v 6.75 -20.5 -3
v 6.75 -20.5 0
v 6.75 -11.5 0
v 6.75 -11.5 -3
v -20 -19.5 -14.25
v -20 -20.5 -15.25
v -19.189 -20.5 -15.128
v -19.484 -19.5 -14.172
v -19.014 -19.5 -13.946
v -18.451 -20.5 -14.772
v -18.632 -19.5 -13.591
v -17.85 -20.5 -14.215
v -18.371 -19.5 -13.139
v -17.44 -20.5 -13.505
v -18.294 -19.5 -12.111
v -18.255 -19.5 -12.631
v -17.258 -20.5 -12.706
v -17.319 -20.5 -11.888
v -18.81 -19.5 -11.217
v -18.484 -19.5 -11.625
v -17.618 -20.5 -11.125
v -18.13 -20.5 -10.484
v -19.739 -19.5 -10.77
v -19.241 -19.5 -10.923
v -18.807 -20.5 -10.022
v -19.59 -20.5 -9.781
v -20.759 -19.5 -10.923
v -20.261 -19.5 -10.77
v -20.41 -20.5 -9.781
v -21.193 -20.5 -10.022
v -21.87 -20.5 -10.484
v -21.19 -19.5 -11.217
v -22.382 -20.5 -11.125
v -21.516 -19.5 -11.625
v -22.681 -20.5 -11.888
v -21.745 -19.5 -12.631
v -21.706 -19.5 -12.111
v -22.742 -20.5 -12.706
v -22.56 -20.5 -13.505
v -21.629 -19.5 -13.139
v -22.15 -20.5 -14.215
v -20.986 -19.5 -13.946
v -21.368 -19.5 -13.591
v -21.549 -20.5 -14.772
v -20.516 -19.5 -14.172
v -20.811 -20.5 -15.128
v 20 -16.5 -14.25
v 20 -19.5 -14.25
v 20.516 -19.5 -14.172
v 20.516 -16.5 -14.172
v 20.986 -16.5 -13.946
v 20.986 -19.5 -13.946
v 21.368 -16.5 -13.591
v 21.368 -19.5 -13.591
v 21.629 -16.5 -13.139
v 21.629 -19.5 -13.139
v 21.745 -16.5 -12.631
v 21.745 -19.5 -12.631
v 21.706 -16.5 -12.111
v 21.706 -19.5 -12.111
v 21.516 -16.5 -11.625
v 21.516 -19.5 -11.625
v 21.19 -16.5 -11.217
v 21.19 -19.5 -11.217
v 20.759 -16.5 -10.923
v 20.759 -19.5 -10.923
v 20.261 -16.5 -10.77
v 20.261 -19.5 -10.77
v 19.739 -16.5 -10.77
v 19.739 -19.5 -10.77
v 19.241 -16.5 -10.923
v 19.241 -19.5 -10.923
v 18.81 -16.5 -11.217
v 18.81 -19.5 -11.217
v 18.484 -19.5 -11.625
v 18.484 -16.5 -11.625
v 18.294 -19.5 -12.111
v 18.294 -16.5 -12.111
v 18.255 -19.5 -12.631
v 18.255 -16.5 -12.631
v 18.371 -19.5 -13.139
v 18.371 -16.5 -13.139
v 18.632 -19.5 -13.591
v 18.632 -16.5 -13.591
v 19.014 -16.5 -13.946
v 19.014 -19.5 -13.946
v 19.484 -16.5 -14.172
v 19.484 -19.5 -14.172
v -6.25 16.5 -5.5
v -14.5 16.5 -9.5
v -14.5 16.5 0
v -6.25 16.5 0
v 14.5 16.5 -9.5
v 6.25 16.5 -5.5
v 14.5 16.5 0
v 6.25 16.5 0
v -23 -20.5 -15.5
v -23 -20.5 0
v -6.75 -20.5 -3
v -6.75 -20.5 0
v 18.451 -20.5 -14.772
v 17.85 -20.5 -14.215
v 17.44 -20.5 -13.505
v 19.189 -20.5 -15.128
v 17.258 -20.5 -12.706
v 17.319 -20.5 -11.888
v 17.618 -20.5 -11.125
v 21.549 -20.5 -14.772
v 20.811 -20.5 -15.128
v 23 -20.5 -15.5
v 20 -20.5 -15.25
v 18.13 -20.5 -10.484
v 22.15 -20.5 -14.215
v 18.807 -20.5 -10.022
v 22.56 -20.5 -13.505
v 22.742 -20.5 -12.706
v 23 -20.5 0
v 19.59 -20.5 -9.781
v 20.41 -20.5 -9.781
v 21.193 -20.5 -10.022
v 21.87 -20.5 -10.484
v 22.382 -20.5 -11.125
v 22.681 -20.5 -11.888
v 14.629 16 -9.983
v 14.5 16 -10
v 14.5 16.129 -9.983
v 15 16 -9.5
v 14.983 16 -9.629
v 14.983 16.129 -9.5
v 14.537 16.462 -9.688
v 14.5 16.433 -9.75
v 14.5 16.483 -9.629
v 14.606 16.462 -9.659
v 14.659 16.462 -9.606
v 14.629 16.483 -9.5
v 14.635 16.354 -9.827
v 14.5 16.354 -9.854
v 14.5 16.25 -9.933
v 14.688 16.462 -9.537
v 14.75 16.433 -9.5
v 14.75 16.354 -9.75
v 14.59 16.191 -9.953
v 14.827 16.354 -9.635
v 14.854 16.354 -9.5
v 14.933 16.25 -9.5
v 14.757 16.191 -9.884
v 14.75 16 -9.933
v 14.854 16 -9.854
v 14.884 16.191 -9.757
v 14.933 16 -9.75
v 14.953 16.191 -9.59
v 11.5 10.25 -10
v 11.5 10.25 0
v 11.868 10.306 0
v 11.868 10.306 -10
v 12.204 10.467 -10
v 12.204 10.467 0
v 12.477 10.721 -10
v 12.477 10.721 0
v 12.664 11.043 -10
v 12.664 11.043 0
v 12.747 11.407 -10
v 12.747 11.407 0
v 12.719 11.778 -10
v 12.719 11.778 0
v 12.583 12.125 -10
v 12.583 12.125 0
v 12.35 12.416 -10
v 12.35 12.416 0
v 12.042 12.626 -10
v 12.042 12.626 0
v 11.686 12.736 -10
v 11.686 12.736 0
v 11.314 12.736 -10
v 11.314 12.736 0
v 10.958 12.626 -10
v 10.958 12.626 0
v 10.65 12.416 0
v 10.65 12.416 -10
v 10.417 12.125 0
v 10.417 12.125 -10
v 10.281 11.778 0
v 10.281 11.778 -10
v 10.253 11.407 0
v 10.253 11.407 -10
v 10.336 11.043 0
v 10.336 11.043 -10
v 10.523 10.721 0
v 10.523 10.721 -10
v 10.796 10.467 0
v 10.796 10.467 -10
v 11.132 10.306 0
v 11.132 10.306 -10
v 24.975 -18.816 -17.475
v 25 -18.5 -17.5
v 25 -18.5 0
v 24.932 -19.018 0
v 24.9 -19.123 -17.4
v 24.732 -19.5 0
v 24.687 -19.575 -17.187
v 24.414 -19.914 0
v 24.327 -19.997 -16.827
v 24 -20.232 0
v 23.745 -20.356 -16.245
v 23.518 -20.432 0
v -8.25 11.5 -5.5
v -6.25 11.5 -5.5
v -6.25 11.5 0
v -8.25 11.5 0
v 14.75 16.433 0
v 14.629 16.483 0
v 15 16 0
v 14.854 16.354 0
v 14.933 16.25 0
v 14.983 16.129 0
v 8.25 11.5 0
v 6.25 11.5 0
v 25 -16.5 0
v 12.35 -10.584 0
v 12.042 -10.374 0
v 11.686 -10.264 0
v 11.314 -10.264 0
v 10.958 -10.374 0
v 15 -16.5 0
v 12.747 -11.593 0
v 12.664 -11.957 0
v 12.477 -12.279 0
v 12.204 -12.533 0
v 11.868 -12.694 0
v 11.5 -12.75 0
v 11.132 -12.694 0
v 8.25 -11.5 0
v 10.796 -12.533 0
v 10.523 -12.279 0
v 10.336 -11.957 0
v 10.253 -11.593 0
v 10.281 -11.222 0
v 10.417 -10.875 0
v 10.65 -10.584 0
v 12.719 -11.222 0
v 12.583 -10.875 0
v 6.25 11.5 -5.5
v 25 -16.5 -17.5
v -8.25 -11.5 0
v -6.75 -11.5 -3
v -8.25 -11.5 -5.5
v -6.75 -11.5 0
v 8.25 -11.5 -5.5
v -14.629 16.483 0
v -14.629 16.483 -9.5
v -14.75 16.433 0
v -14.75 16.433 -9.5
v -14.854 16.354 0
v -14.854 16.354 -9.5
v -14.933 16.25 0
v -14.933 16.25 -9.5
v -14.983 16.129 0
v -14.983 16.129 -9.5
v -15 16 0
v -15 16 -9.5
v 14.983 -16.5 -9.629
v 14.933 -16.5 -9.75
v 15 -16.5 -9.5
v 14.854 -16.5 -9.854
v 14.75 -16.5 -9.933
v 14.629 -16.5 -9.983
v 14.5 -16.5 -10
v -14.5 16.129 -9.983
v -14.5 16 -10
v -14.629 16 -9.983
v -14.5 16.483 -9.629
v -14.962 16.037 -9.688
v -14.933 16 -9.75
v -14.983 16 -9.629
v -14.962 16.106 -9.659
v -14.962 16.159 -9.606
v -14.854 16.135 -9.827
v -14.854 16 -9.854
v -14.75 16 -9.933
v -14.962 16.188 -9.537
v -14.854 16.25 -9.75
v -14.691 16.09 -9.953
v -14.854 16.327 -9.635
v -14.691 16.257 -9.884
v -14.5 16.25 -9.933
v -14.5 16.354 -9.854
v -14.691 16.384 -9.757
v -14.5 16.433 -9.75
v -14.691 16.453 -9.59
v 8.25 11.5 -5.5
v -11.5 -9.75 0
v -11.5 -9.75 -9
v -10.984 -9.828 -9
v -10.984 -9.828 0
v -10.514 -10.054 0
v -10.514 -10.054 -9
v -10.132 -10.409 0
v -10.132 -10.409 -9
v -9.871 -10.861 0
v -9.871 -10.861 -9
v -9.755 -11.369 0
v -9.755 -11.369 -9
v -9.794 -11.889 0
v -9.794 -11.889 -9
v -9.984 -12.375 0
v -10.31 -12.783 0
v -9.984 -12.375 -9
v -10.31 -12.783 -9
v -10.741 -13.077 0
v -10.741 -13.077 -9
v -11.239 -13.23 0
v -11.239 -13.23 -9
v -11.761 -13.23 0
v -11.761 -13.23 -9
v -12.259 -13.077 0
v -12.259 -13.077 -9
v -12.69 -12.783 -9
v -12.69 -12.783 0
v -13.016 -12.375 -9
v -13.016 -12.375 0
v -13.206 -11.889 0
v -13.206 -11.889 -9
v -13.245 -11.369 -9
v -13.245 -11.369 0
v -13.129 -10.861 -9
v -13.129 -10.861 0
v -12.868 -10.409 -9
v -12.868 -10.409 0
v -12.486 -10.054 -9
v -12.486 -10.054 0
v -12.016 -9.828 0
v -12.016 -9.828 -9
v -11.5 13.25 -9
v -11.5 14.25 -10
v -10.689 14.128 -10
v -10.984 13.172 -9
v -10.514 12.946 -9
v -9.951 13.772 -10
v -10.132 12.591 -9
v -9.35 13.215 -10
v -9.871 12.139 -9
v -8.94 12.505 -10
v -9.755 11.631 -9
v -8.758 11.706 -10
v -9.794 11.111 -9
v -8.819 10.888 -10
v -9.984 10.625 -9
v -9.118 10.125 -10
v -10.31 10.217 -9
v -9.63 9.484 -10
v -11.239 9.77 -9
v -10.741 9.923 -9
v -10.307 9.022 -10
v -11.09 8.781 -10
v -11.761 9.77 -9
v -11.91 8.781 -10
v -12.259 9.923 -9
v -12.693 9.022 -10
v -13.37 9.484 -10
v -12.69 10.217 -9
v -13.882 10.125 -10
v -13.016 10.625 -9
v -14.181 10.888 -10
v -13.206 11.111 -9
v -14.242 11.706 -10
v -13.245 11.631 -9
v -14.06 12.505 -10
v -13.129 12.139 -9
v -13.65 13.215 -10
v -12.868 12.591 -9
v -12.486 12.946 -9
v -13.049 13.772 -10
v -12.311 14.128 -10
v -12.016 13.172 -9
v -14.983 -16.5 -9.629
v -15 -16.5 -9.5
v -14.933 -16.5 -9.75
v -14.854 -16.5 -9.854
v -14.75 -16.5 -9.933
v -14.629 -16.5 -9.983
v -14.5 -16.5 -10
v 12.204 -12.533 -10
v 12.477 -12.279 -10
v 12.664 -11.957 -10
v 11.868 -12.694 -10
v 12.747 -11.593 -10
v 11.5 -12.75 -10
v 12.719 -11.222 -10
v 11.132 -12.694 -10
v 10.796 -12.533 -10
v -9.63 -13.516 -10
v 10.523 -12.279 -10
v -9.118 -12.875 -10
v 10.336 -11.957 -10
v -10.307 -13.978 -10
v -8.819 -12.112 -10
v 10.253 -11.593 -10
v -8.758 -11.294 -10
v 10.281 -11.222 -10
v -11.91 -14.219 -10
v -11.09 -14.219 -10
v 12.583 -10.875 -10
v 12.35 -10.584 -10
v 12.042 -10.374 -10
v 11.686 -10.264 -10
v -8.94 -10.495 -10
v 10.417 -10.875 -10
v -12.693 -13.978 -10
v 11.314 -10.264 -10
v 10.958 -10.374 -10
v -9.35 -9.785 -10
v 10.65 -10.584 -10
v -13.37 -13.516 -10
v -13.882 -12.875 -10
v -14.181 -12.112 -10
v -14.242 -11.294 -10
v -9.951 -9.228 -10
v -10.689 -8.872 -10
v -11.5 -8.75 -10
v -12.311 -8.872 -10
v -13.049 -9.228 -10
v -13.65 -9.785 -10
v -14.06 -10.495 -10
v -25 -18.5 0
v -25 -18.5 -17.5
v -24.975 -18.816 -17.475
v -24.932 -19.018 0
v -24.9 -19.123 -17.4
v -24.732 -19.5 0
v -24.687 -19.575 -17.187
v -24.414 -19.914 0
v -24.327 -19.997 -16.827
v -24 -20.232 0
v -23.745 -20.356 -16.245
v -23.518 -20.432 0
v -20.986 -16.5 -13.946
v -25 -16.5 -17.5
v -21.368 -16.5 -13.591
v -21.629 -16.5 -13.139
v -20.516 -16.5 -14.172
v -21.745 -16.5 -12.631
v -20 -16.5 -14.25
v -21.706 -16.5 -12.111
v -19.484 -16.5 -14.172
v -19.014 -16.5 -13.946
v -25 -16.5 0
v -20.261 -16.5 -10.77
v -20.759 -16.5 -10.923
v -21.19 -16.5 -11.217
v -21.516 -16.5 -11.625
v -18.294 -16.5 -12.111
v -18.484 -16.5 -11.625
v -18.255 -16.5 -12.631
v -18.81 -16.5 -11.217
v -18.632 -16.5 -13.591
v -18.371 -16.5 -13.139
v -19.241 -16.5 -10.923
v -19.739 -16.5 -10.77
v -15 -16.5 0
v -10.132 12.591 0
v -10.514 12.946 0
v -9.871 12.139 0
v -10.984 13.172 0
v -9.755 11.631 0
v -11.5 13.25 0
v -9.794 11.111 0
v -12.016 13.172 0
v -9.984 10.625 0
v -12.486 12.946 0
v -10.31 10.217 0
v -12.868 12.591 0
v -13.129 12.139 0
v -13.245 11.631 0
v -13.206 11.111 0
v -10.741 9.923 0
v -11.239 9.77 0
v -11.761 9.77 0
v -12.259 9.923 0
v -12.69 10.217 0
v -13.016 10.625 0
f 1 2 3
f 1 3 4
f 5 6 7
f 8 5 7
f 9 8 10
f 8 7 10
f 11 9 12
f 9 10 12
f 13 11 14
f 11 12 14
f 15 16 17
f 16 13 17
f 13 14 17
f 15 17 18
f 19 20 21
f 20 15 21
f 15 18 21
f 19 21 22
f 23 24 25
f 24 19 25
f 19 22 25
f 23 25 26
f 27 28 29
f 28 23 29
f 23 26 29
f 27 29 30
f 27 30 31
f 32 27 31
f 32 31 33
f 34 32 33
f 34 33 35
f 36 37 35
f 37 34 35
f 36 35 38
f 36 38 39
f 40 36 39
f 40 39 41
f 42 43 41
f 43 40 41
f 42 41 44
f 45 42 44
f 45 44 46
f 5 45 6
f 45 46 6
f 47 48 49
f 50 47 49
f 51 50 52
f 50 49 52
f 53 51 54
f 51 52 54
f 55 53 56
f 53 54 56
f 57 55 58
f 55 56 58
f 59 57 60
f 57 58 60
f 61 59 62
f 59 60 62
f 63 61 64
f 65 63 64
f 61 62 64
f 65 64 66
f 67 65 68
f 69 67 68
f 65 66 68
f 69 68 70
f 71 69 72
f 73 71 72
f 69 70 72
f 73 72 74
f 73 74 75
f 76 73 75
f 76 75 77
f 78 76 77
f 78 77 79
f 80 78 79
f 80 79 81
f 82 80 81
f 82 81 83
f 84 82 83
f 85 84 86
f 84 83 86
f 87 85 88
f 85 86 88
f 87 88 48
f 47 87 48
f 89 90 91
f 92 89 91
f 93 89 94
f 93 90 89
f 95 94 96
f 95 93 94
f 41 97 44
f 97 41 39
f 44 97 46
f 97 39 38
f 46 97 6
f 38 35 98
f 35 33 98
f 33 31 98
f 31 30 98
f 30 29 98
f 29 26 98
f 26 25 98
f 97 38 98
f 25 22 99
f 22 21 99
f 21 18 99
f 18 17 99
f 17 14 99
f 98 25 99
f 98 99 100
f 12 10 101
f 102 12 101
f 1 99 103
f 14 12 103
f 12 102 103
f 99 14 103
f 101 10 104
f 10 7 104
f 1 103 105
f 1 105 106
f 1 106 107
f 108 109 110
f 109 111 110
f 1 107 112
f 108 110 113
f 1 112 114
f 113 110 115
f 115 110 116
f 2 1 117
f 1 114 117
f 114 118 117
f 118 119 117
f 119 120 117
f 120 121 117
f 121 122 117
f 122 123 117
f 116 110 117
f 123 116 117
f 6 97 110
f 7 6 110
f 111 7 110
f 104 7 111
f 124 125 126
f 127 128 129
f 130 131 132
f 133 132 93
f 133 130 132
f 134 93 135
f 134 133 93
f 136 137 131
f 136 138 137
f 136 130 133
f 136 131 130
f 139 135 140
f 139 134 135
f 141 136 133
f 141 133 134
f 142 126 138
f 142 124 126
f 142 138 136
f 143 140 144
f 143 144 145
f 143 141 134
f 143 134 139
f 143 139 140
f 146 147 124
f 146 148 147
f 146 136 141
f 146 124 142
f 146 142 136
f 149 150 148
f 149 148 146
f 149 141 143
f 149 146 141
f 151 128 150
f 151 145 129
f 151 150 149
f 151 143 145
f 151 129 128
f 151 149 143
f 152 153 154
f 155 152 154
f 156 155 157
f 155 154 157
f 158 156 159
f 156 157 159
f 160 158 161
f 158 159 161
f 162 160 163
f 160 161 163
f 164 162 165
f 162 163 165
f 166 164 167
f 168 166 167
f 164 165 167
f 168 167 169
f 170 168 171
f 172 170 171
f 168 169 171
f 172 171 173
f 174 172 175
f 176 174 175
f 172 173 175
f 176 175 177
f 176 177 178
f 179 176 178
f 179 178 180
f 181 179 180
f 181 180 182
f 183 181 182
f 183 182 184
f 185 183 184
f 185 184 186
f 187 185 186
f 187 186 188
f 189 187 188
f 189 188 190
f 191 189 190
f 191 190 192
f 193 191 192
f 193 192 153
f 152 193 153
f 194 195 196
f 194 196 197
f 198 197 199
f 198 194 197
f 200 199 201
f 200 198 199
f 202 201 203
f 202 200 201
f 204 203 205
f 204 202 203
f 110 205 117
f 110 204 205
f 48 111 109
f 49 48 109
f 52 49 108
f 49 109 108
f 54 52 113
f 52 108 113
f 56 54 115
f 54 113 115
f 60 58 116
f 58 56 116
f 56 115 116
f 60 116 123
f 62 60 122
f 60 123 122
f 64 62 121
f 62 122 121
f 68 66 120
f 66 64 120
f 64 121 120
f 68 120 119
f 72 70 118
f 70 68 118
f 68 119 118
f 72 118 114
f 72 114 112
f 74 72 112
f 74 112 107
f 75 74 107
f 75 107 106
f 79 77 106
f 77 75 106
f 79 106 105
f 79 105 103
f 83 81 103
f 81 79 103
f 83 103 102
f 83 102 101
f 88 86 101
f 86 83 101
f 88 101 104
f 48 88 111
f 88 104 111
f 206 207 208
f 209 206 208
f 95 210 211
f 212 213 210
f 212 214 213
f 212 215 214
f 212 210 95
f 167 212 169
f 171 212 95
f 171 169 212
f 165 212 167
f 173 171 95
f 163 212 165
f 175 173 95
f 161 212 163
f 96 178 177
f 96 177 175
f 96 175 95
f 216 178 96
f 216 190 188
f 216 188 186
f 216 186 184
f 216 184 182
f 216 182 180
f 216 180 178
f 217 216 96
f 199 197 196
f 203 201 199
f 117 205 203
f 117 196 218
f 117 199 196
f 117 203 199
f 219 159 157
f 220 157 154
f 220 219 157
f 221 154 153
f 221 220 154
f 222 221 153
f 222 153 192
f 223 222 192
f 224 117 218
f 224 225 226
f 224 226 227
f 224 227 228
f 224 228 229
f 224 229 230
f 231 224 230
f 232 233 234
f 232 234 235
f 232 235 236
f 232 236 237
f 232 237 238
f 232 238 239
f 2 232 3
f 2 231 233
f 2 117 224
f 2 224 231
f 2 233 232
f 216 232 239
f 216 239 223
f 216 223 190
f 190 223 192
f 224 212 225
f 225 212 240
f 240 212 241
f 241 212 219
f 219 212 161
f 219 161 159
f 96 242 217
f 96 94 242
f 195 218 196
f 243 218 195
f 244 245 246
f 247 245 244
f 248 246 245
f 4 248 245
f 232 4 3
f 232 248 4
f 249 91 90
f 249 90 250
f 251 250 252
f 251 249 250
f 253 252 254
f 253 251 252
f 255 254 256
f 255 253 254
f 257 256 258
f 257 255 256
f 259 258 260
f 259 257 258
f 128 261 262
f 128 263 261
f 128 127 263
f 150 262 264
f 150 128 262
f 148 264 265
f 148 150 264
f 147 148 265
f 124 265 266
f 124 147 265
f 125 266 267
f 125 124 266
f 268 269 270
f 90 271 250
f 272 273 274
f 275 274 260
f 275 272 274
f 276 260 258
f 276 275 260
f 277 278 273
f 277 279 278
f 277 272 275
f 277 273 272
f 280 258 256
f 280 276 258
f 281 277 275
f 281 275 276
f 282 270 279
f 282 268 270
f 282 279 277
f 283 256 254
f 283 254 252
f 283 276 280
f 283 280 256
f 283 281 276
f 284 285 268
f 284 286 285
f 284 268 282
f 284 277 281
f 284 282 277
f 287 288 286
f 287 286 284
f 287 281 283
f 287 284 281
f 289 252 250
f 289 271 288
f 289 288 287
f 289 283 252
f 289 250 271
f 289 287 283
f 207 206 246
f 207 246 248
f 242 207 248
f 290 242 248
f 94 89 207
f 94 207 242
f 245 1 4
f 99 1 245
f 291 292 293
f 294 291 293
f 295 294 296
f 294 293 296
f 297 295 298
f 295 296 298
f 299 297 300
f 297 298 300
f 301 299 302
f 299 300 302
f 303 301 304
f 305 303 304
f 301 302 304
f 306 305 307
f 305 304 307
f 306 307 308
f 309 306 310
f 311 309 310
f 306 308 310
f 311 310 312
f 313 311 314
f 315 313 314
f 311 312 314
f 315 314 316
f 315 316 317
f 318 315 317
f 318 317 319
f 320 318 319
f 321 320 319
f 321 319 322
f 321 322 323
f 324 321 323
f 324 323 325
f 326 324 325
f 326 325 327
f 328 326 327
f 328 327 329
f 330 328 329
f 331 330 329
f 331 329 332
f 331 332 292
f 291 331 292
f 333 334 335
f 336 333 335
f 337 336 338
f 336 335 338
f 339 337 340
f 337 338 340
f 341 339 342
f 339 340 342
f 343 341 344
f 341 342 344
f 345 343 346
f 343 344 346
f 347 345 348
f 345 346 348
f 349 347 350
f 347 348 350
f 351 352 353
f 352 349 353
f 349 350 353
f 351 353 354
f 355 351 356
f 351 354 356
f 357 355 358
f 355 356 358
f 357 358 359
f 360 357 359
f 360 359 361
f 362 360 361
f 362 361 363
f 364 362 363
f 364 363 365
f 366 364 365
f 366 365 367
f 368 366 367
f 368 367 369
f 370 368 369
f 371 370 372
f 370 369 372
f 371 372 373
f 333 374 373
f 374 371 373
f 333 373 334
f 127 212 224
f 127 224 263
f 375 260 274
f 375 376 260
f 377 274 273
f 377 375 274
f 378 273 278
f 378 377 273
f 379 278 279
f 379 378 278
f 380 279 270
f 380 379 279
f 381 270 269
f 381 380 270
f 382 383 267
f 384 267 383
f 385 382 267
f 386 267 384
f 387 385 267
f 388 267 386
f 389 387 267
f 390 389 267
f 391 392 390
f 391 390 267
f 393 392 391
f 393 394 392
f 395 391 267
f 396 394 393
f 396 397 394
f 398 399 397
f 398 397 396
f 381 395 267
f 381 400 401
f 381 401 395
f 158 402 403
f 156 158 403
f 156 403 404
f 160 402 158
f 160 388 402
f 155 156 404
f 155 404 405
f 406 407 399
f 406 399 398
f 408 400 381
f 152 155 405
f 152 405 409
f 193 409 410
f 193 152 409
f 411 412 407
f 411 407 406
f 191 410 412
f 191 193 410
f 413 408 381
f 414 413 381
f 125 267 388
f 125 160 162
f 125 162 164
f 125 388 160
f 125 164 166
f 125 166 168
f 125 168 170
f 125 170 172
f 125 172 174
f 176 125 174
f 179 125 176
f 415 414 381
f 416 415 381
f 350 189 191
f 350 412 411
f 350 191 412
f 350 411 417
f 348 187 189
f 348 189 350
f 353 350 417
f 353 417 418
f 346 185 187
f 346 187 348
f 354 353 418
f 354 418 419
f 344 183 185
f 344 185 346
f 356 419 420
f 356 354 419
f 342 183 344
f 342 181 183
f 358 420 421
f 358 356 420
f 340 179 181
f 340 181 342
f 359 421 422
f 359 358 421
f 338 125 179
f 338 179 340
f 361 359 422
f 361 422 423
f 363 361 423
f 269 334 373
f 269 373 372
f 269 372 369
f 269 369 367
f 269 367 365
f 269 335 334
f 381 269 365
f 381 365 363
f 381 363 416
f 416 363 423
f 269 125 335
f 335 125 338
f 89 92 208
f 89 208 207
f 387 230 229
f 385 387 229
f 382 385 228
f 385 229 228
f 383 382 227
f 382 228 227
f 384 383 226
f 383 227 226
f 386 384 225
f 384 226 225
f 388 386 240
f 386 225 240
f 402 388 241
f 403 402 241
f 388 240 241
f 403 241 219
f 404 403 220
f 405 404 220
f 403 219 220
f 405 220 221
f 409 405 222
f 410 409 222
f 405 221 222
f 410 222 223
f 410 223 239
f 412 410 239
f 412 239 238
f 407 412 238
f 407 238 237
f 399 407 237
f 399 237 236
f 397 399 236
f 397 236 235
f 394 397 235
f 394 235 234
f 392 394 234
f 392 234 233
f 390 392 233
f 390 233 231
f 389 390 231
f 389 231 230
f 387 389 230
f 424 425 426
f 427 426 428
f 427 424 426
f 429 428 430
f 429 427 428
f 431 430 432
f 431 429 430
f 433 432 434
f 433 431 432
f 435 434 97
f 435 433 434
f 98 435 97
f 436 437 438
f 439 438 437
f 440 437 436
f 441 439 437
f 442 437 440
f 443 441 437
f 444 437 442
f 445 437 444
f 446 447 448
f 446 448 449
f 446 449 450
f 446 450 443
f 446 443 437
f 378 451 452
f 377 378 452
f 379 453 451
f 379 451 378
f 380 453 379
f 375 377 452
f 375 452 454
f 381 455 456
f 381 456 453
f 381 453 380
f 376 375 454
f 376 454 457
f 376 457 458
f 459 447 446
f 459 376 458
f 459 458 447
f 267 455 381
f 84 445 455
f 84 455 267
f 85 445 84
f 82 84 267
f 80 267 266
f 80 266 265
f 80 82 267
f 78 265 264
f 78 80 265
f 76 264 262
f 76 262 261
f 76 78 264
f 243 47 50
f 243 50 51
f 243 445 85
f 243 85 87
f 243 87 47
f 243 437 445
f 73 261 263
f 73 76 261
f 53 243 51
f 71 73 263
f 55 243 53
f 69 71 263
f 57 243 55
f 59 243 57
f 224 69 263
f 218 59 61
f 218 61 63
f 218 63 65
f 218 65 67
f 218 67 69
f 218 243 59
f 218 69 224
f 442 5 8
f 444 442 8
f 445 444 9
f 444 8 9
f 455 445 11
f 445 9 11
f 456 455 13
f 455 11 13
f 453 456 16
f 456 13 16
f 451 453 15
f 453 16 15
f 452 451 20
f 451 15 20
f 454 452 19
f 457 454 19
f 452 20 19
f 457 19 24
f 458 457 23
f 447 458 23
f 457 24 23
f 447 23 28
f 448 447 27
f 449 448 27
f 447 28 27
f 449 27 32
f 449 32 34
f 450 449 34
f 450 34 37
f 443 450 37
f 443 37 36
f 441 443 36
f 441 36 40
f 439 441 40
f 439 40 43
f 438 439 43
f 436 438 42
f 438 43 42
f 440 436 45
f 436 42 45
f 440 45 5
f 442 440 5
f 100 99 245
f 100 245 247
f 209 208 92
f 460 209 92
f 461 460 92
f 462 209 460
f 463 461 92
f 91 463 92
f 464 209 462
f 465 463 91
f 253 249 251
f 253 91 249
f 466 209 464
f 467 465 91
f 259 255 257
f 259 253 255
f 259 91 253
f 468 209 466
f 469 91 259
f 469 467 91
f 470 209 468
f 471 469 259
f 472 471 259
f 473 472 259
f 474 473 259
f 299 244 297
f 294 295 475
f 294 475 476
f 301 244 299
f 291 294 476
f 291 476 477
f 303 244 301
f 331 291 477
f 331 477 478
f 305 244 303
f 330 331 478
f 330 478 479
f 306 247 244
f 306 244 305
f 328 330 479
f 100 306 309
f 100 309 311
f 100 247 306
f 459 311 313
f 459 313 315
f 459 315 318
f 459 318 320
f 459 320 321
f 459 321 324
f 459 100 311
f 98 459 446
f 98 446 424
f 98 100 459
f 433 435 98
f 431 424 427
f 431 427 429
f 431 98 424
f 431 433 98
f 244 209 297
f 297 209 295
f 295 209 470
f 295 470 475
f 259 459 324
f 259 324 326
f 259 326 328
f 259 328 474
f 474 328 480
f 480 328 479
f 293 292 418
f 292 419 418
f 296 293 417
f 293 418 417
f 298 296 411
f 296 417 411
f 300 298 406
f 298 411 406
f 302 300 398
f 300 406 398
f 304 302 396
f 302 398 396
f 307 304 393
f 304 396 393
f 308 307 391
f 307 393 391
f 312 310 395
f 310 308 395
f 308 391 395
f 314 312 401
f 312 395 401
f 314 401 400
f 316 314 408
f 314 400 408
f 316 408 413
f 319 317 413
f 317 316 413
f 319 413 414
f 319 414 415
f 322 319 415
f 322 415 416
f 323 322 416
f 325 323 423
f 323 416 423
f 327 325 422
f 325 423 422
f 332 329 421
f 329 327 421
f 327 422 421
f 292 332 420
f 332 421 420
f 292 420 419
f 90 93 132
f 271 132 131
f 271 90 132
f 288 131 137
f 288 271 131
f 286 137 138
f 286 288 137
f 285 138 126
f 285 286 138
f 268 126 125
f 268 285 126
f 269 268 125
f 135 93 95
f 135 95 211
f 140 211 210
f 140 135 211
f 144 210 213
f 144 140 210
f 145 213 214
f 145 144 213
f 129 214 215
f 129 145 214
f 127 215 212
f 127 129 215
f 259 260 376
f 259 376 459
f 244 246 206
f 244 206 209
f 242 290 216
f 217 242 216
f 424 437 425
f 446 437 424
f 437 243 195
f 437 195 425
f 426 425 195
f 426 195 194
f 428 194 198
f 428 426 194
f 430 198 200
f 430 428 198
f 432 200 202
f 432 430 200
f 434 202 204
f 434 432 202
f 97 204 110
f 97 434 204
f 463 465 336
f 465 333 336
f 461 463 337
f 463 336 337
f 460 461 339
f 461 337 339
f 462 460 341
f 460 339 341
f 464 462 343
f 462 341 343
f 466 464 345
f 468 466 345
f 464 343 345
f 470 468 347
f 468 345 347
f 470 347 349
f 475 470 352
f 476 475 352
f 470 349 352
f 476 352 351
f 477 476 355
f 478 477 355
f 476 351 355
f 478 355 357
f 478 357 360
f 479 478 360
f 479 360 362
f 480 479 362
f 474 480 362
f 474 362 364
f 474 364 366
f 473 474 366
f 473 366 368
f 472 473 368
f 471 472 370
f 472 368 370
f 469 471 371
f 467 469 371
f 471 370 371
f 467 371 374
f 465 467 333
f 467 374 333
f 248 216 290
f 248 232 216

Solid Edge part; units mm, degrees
sketch "Sketch1" plane through (0, 0, 0) normal (0, -1, 0) x (1, 0, 0)
  line L0 (-15, 10) -> (15, 10)
  line L1 (15, 10) -> (15, -10)
  line L2 (15, -10) -> (-15, -10)
  line L3 (-15, -10) -> (-15, 10)
  dimension "D1" = 20
  dimension "D2" = 30
extrude "Protrusion1" add sketch "Sketch1" along normal mid plane 33
sketch "Sketch2" plane through (0, -16.5, 0) normal (0, -1, 0) x (1, 0, 0)
  line L0 (-25, 17.5) -> (25, 17.5)
  line L1 (25, 17.5) -> (25, -17.5)
  line L2 (25, -17.5) -> (-25, -17.5)
  line L3 (-25, -17.5) -> (-25, 17.5)
  dimension "D1" = 50
  dimension "D2" = 35
extrude "Ausprägung_2" add sketch "Sketch2" along normal blind 4
sketch "Sketch3" plane through (0, -20.5, 0) normal (0, -1, 0) x (1, 0, 0)
  line L0 (-6.75, 3) -> (6.75, 3)
  line L1 (6.75, 3) -> (6.75, -3)
  line L2 (6.75, -3) -> (-6.75, -3)
  line L3 (-6.75, -3) -> (-6.75, 3)
  dimension "D1" = 13.5
  dimension "D2" = 6
extrude "Ausschnitt_1" cut sketch "Sketch3" against normal blind 9
sketch "Sketch4" plane through (0, -11.5, 0) normal (0, -1, 0) x (1, 0, 0)
  line L0 (-8.25, 5.5) -> (8.25, 5.5)
  line L1 (8.25, 5.5) -> (8.25, -5.5)
  line L2 (8.25, -5.5) -> (-8.25, -5.5)
  line L3 (-8.25, -5.5) -> (-8.25, 5.5)
  dimension "D1" = 16.5
  dimension "D2" = 11
extrude "Ausschnitt_2" cut sketch "Sketch4" against normal blind 23
sketch "Sketch5" plane through (0, 16.5, 0) normal (0, 1, 0) x (-1, 0, 0)
  line L0 (6.25, 5.5) -> (6.25, -5.5)
  line L1 (6.25, -5.5) -> (-6.25, -5.5)
  line L2 (-6.25, -5.5) -> (-6.25, 5.5)
  line L3 (-6.25, 5.5) -> (6.25, 5.5)
  dimension "D1" = 11
  dimension "D2" = 12.5
extrude "Ausschnitt_3" cut sketch "Sketch5" against normal blind 5
sketch "Sketch6" plane through (0, -20.5, 0) normal (0, -1, 0) x (1, 0, 0)
  line L0 (-37.3753, 23.8002) -> (37.3753, 23.8002)
  line L1 (37.3753, 23.8002) -> (37.3753, 0)
  line L2 (37.3753, 0) -> (-37.3753, 0)
  line L3 (-37.3753, 0) -> (-37.3753, 23.8002)
extrude "Ausschnitt_4" cut sketch "Sketch6" against normal blind 187.325
hole "Bohrung_1" at (20, -20.5, -12.5) direction (0, 1, 0) diameter 3.5 end up to next countersink diameter 5.5 countersink angle 90
hole "Hole1" at (-20, -20.5, -12.5) direction (0, 1, 0) diameter 3.5 end up to next countersink diameter 5.5 countersink angle 90
hole "Bohrung_3" at (11.5, -11.5, 0) direction (0, 0, -1) diameter 2.5 end through all
hole "Hole2" at (11.5, 11.5, 0) direction (0, 0, -1) diameter 2.5 end through all
hole "Bohrung_5" at (-11.5, 11.5, -10) direction (0, 0, 1) diameter 3.5 end up to next countersink diameter 5.5 countersink angle 90
hole "Hole3" at (-11.5, -11.5, -10) direction (0, 0, 1) diameter 3.5 end up to next countersink diameter 5.5 countersink angle 90
fillet "Verrundung_2" radius 2 3 edges at (25, -20.5, -8.75) (0, -20.5, -17.5) (-25, -20.5, -8.75)
fillet "Verrundung_3" radius 0.5 5 edges at (15, 0, -10) (0, 16.5, -10) (-15, 0, -10) (-15, 16.5, -5) (15, 16.5, -5)
